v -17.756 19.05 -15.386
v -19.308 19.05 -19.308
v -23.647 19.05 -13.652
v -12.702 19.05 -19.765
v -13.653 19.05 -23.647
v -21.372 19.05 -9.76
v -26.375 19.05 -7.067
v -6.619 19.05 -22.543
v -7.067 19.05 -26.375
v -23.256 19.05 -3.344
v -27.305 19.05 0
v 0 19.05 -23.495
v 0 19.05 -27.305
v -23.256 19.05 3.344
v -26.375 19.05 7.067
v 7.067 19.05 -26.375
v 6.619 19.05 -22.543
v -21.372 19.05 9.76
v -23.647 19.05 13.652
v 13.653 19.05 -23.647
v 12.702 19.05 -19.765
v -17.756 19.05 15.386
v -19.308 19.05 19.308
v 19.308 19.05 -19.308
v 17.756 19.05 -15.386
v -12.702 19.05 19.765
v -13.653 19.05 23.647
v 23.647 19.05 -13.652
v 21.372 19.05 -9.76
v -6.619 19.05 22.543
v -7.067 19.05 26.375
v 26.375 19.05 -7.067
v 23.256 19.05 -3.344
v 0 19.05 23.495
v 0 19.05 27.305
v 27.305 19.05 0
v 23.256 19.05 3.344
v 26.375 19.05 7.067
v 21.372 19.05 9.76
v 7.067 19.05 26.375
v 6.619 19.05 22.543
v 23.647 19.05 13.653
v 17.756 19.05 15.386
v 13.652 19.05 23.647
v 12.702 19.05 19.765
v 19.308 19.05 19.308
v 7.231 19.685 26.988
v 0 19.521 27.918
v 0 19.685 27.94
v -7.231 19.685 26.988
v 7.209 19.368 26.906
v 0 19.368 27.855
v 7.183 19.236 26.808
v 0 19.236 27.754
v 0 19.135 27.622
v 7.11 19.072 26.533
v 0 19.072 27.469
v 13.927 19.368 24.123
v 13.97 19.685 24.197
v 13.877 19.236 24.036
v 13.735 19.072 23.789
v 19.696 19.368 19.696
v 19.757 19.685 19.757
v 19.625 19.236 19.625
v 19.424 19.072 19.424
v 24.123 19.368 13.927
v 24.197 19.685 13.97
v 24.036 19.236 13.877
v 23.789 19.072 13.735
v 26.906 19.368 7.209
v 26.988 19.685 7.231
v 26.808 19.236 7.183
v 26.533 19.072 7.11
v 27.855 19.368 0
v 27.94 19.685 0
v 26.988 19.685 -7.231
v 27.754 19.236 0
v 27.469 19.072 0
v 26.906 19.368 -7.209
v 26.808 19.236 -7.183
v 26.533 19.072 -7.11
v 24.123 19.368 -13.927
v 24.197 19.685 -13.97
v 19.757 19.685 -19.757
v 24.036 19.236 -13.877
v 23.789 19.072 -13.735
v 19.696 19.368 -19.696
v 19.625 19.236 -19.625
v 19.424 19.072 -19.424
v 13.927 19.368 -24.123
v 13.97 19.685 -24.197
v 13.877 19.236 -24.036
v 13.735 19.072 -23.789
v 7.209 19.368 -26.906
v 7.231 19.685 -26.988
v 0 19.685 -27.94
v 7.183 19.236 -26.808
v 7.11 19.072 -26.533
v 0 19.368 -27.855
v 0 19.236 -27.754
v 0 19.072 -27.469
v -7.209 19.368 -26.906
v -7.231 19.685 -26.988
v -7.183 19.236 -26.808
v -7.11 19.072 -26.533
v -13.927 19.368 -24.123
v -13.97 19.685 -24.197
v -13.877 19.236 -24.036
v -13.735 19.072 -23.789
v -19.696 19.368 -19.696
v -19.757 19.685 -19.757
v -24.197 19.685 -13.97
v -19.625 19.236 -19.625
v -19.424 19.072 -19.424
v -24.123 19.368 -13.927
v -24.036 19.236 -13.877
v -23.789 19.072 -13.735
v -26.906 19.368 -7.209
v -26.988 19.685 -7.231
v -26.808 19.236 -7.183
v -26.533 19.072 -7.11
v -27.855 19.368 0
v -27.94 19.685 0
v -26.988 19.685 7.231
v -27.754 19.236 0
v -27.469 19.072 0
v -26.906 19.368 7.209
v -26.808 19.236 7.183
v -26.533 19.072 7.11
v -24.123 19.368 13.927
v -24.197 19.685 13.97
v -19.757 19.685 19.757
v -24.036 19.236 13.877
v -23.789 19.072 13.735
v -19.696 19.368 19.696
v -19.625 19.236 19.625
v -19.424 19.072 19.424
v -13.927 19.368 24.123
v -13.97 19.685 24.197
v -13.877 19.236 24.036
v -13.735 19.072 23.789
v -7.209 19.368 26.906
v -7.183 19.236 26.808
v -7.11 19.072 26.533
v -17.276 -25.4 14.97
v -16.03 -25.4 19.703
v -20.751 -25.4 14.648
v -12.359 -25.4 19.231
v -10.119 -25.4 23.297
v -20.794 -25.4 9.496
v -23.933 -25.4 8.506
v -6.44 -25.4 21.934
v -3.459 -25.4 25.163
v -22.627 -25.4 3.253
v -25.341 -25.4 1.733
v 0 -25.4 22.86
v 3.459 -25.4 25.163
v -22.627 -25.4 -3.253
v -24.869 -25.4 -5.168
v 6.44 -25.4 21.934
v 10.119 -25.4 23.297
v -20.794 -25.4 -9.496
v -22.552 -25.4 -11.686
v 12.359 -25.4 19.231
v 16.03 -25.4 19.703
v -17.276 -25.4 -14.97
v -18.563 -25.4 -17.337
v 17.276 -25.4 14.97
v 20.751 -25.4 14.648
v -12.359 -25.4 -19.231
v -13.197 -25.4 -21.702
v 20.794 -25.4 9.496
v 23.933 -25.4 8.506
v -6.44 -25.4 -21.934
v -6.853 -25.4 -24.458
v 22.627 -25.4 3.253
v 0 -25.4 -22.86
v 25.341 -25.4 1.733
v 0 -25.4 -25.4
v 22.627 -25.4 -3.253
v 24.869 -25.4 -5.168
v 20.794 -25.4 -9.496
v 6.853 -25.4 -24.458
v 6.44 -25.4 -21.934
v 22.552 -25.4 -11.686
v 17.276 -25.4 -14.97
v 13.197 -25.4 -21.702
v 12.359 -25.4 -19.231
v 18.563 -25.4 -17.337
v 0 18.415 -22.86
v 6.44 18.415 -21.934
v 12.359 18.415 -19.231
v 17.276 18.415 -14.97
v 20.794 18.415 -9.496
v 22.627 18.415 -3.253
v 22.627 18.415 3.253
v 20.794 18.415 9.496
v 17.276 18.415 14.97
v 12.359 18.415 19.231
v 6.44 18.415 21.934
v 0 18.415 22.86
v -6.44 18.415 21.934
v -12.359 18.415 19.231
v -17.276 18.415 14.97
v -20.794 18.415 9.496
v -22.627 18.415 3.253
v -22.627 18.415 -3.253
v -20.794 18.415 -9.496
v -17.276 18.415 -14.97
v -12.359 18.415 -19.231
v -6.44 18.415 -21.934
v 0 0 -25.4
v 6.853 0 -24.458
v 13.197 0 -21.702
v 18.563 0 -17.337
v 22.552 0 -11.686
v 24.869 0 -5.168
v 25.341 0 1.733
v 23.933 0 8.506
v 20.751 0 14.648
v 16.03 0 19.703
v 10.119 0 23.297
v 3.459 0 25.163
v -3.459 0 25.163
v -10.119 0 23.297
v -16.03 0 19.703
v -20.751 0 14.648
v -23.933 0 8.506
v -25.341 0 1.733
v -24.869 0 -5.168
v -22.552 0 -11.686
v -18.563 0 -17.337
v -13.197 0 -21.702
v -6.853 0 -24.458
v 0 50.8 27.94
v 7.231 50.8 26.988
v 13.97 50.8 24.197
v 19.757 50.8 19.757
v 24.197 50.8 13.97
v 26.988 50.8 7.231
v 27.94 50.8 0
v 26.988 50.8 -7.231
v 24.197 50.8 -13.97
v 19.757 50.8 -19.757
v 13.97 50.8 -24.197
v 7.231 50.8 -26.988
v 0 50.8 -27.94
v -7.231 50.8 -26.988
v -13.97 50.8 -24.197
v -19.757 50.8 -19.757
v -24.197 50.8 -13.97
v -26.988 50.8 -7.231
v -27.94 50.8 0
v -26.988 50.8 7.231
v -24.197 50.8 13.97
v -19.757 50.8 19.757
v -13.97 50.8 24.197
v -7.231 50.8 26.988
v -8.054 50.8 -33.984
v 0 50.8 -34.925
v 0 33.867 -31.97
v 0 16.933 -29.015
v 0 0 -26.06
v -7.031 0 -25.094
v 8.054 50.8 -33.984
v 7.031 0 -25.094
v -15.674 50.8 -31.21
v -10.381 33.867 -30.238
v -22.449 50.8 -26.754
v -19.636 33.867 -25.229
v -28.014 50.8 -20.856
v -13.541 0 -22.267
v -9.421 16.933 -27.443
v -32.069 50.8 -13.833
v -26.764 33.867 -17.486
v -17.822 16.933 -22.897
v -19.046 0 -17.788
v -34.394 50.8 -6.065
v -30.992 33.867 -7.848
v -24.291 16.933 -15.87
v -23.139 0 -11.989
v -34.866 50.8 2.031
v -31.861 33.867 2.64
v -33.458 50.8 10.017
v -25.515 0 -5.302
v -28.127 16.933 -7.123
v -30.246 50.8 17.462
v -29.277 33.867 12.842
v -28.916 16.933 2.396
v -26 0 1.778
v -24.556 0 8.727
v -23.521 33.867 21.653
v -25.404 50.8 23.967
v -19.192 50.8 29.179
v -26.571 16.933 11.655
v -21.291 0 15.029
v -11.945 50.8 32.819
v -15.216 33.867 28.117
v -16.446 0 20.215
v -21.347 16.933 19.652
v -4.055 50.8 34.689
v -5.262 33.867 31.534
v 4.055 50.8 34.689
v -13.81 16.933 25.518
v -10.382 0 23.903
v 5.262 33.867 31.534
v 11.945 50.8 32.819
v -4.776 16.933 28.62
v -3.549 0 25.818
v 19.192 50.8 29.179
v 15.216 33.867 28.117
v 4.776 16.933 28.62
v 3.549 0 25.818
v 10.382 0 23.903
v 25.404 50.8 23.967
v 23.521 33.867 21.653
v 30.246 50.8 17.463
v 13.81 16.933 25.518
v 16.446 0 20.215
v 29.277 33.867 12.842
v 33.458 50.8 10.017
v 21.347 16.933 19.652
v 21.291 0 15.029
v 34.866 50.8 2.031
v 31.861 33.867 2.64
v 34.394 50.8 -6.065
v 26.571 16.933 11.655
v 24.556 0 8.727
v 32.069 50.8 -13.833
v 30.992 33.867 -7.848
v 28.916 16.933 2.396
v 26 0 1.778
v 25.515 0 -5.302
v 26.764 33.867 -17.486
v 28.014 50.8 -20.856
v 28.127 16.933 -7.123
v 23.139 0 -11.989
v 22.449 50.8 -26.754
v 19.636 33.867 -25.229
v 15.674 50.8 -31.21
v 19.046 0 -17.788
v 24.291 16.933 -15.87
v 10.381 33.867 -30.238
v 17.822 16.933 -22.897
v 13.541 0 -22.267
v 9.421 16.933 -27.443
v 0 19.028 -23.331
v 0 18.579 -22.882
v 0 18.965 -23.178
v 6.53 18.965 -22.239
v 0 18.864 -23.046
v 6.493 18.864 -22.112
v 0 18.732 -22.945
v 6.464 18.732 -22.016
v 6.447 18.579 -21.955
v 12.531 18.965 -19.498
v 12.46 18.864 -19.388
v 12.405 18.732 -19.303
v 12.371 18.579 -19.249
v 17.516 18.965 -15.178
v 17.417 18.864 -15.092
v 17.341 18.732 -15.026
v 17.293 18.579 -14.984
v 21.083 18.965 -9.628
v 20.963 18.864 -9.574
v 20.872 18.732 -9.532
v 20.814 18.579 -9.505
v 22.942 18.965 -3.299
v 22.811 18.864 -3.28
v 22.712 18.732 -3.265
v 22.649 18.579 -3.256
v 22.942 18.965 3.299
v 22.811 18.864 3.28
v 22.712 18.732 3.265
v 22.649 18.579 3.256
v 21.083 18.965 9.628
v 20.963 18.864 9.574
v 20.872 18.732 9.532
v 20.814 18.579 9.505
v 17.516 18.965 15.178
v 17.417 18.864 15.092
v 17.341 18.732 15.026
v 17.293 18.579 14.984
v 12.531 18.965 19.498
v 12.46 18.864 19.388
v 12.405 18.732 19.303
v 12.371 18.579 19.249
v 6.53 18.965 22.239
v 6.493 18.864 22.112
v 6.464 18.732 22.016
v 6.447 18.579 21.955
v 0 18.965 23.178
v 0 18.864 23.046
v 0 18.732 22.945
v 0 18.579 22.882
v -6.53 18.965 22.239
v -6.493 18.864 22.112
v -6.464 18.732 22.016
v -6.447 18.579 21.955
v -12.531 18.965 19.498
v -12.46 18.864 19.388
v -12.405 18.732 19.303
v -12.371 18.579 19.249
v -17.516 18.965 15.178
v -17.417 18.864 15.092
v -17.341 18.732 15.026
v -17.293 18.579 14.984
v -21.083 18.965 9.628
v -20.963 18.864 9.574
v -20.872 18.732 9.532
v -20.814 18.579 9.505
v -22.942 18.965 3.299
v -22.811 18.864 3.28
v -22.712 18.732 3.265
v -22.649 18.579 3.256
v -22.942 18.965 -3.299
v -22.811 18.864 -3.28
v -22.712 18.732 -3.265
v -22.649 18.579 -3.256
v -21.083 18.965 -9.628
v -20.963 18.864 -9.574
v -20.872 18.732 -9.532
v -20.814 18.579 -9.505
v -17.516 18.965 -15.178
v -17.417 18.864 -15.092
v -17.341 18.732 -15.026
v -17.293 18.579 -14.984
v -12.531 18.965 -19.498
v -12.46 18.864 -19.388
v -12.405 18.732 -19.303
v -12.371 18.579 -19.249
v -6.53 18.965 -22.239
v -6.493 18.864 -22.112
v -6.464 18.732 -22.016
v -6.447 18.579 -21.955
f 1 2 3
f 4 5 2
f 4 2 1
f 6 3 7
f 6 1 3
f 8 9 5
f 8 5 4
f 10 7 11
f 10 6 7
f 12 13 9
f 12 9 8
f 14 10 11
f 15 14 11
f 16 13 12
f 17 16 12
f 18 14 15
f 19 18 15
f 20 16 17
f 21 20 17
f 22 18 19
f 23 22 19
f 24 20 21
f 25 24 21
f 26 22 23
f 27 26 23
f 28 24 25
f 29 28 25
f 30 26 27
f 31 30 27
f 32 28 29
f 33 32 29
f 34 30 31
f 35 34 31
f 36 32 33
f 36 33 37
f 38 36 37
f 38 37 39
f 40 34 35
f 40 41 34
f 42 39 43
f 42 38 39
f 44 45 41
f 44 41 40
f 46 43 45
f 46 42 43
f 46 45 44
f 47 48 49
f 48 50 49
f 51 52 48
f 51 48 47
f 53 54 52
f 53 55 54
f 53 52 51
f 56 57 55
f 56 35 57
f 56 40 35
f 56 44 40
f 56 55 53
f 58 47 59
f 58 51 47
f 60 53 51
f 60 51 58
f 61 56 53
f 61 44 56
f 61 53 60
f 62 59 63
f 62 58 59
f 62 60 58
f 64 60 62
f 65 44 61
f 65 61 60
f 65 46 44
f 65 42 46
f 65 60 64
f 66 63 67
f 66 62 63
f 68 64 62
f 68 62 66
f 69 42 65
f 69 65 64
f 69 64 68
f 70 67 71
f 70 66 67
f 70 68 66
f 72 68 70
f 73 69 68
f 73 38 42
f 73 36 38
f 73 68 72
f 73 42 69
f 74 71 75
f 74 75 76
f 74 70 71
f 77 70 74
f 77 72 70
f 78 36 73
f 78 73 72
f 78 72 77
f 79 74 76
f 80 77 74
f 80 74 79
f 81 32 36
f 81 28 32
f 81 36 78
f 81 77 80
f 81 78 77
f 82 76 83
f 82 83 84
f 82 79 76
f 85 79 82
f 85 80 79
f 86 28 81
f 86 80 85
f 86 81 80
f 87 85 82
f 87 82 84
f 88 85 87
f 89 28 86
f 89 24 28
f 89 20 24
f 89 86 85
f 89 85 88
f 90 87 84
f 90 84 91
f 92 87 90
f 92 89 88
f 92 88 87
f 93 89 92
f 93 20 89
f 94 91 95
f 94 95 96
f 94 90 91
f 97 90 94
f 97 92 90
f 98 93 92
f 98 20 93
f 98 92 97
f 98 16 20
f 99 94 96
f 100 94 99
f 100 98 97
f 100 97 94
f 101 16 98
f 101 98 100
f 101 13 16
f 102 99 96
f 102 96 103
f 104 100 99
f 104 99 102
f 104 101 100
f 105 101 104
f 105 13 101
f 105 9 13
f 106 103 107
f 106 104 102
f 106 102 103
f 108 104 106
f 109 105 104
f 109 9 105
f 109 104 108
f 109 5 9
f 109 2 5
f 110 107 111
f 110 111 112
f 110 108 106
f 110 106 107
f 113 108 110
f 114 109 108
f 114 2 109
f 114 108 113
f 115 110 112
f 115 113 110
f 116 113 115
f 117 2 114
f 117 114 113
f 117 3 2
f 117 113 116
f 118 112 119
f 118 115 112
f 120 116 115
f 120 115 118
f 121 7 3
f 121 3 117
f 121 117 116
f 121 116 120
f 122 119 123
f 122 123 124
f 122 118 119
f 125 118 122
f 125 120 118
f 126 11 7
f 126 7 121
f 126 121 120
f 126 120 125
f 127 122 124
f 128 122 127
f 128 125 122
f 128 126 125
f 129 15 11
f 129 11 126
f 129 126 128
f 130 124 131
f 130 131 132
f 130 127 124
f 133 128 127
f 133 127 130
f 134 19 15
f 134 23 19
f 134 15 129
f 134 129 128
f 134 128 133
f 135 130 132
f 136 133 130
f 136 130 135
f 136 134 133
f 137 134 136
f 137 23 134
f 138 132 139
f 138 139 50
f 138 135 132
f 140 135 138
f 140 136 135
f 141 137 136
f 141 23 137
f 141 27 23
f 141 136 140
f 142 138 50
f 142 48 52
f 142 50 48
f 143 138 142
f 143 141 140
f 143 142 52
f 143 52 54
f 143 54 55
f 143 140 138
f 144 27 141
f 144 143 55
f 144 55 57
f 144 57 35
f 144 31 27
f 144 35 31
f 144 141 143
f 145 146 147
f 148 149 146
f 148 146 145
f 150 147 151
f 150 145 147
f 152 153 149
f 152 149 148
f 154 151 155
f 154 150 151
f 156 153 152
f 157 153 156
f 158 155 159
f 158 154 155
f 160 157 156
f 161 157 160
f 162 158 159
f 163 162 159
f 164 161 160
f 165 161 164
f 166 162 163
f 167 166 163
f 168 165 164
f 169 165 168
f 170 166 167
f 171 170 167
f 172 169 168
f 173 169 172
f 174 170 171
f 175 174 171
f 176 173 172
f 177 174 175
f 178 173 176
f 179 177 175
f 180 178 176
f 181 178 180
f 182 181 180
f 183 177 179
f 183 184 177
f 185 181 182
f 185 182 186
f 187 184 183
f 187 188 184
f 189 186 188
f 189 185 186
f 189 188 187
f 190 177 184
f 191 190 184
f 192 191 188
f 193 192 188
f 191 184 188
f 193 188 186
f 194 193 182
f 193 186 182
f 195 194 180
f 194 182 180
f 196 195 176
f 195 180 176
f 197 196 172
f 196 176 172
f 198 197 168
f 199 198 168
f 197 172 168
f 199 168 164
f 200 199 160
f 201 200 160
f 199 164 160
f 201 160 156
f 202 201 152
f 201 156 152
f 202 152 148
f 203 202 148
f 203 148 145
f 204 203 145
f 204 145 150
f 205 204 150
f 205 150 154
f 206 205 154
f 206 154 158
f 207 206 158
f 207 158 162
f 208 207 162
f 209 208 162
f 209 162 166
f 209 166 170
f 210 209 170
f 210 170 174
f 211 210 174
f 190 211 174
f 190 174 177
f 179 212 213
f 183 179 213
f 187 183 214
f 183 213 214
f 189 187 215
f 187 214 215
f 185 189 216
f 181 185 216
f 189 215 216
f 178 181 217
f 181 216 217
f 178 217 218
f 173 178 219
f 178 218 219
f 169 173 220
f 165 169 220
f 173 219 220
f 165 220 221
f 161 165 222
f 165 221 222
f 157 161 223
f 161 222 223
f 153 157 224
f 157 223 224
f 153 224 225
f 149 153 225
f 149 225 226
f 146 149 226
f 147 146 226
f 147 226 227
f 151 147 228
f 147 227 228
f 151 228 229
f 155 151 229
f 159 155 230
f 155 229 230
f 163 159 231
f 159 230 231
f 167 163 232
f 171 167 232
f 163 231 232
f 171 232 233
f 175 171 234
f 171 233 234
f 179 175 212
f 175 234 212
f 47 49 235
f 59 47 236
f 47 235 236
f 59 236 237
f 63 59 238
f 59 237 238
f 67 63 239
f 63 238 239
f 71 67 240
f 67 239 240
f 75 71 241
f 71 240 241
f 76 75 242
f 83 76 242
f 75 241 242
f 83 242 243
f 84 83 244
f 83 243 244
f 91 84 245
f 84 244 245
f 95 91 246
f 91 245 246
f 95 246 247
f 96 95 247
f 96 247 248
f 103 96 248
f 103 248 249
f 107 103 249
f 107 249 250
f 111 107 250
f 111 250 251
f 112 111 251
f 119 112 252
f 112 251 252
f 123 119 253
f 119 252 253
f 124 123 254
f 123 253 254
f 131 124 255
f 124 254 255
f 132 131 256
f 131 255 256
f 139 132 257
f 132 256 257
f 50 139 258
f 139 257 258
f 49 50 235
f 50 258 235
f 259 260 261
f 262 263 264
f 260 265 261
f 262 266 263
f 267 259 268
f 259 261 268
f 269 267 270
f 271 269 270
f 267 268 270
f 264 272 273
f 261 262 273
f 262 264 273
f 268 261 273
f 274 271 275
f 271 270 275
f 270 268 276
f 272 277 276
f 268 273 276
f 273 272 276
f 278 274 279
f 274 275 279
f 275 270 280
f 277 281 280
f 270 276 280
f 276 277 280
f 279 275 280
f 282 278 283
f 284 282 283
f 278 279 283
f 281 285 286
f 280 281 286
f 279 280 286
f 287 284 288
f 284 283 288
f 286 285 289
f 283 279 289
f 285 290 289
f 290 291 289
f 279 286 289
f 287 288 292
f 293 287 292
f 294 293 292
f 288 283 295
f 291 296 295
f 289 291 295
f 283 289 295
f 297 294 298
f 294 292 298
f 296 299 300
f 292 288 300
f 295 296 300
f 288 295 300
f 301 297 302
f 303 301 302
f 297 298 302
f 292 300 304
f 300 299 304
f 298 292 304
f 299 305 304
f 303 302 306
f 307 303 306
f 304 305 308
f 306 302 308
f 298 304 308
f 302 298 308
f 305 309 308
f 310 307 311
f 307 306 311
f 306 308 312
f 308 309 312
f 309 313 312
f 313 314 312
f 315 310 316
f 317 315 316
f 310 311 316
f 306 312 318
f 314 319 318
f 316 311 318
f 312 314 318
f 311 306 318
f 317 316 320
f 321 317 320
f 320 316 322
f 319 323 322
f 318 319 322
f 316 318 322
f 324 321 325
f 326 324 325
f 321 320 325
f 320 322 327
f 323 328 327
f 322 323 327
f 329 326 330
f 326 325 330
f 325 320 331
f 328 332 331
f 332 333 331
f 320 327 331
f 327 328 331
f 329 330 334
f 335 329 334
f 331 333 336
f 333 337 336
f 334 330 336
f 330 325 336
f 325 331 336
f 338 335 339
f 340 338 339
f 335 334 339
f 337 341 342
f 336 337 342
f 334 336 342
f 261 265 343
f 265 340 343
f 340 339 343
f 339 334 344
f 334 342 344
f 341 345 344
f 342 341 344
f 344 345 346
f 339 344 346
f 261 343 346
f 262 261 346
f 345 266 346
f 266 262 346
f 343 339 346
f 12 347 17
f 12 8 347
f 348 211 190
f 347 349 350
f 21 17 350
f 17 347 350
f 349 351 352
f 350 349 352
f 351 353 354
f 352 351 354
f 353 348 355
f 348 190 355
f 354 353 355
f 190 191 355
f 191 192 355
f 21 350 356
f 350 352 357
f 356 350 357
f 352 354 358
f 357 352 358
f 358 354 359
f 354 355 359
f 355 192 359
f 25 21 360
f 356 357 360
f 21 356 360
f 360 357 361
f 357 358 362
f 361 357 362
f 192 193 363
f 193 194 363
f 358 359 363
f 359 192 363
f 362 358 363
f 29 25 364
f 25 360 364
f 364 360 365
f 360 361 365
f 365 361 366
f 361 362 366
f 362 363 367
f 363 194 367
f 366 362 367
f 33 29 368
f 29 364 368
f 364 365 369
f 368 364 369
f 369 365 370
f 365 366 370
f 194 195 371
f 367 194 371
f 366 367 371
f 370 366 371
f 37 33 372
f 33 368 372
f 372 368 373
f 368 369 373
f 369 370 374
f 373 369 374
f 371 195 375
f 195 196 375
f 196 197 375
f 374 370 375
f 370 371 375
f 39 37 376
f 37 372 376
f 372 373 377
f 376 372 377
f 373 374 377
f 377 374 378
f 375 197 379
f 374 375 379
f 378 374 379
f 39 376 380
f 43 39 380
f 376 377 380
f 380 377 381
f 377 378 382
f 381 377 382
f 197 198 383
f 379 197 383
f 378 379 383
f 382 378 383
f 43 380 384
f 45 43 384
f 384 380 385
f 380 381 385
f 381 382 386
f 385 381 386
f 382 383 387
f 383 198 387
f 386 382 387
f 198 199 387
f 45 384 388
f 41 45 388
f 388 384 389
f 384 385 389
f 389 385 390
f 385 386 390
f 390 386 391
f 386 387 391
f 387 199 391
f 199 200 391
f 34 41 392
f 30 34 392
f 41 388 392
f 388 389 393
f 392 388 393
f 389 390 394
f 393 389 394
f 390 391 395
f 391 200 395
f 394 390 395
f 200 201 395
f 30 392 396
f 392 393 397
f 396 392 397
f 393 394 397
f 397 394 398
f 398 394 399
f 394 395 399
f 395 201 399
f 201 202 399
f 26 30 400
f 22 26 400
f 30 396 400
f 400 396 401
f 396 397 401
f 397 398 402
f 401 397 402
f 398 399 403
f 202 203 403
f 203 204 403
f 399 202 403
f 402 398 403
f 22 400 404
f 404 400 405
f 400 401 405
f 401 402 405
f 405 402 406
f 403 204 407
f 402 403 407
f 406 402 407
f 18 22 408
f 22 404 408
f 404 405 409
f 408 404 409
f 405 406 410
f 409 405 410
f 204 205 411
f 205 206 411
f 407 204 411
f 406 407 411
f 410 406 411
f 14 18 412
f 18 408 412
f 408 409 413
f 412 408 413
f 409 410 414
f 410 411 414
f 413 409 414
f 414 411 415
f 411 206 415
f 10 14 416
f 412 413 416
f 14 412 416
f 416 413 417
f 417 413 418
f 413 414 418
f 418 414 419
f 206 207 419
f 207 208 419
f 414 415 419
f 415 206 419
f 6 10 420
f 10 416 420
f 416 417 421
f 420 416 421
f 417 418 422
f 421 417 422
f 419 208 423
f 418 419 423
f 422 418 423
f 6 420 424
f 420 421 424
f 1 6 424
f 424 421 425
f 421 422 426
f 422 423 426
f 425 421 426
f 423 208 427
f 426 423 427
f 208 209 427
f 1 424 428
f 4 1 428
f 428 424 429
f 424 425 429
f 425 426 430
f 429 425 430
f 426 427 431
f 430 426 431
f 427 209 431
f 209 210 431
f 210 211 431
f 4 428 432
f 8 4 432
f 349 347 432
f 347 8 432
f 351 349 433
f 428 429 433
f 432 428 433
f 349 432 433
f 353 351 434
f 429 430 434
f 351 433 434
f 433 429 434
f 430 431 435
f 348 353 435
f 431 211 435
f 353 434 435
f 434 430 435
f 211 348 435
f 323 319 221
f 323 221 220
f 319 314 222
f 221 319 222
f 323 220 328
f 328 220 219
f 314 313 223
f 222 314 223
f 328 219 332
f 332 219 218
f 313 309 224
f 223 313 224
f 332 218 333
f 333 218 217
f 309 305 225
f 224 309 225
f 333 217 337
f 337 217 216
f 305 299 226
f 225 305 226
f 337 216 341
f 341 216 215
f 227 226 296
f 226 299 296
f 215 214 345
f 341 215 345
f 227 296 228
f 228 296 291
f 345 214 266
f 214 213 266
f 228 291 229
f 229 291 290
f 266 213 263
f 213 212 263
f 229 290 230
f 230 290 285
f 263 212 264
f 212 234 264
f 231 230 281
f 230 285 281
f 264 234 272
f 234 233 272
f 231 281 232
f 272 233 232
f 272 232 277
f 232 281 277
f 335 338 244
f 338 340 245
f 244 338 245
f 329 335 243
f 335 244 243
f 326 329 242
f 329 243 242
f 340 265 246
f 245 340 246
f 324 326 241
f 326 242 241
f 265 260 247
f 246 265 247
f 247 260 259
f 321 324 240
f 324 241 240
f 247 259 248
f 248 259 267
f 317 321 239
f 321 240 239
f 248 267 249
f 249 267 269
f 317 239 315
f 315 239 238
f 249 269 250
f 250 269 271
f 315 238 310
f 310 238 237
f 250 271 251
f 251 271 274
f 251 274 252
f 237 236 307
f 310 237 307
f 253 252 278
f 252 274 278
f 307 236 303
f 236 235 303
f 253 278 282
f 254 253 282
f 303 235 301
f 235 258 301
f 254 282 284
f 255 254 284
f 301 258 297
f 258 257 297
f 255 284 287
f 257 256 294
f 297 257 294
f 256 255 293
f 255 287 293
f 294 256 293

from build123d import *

# Parameters (mm, degrees)
SKETCH6_R           = 25.4
BOSS_EXTRUDE2_DEPTH = 25.4
SKETCH7_R           = 22.86
CUT_EXTRUDE1_DEPTH  = 91.807220253
SKETCH8_R           = 27.94
CUT_EXTRUDE2_DEPTH  = 31.75
FILLET1_R           = 0.635


with BuildPart() as part:
    # Sketch5 → Revolve1 (revolve)
    with BuildSketch(Plane.XY, mode=Mode.PRIVATE) as revolve1_sk:
        Polygon((0, 0), (0, 50.8), (-34.925, 50.8), (-26.0604, 0), align=None)
    revolve(revolve1_sk.sketch.rotate(Axis((0, 0, 0), (0, 1, 0)), 270), axis=Axis((0, 0, 0), (0, 1, 0)))

    # Sketch6 → Boss-Extrude2 (add)
    with BuildSketch(Plane.XZ):
        with Locations(Location((0, 0, 0), (0, 0, 270))):
            Circle(SKETCH6_R)
    extrude(amount=BOSS_EXTRUDE2_DEPTH)

    # Sketch7 → Cut-Extrude1 (cut, through all)
    with BuildSketch(Plane.XZ.offset(25.4)):
        with Locations(Location((0, 0, 0), (0, 0, 270))):
            Circle(SKETCH7_R)
    extrude(amount=-CUT_EXTRUDE1_DEPTH, mode=Mode.SUBTRACT)

    # Sketch8 → Cut-Extrude2 (cut)
    with BuildSketch(Plane(origin=(0, 50.8, 0), x_dir=(1, 0, 0), z_dir=(0, 1, 0))):
        with Locations(Location((0, 0, 0), (0, 0, 270))):
            Circle(SKETCH8_R)
    extrude(amount=-CUT_EXTRUDE2_DEPTH, mode=Mode.SUBTRACT)

    # Fillet1
    fillet1_edges = [part.edges().sort_by_distance(p)[0] for p in [
        (0, 19.05, -27.94),
        (0, 19.05, 22.86),
    ]]
    fillet(fillet1_edges, radius=FILLET1_R)


solid = part.part
